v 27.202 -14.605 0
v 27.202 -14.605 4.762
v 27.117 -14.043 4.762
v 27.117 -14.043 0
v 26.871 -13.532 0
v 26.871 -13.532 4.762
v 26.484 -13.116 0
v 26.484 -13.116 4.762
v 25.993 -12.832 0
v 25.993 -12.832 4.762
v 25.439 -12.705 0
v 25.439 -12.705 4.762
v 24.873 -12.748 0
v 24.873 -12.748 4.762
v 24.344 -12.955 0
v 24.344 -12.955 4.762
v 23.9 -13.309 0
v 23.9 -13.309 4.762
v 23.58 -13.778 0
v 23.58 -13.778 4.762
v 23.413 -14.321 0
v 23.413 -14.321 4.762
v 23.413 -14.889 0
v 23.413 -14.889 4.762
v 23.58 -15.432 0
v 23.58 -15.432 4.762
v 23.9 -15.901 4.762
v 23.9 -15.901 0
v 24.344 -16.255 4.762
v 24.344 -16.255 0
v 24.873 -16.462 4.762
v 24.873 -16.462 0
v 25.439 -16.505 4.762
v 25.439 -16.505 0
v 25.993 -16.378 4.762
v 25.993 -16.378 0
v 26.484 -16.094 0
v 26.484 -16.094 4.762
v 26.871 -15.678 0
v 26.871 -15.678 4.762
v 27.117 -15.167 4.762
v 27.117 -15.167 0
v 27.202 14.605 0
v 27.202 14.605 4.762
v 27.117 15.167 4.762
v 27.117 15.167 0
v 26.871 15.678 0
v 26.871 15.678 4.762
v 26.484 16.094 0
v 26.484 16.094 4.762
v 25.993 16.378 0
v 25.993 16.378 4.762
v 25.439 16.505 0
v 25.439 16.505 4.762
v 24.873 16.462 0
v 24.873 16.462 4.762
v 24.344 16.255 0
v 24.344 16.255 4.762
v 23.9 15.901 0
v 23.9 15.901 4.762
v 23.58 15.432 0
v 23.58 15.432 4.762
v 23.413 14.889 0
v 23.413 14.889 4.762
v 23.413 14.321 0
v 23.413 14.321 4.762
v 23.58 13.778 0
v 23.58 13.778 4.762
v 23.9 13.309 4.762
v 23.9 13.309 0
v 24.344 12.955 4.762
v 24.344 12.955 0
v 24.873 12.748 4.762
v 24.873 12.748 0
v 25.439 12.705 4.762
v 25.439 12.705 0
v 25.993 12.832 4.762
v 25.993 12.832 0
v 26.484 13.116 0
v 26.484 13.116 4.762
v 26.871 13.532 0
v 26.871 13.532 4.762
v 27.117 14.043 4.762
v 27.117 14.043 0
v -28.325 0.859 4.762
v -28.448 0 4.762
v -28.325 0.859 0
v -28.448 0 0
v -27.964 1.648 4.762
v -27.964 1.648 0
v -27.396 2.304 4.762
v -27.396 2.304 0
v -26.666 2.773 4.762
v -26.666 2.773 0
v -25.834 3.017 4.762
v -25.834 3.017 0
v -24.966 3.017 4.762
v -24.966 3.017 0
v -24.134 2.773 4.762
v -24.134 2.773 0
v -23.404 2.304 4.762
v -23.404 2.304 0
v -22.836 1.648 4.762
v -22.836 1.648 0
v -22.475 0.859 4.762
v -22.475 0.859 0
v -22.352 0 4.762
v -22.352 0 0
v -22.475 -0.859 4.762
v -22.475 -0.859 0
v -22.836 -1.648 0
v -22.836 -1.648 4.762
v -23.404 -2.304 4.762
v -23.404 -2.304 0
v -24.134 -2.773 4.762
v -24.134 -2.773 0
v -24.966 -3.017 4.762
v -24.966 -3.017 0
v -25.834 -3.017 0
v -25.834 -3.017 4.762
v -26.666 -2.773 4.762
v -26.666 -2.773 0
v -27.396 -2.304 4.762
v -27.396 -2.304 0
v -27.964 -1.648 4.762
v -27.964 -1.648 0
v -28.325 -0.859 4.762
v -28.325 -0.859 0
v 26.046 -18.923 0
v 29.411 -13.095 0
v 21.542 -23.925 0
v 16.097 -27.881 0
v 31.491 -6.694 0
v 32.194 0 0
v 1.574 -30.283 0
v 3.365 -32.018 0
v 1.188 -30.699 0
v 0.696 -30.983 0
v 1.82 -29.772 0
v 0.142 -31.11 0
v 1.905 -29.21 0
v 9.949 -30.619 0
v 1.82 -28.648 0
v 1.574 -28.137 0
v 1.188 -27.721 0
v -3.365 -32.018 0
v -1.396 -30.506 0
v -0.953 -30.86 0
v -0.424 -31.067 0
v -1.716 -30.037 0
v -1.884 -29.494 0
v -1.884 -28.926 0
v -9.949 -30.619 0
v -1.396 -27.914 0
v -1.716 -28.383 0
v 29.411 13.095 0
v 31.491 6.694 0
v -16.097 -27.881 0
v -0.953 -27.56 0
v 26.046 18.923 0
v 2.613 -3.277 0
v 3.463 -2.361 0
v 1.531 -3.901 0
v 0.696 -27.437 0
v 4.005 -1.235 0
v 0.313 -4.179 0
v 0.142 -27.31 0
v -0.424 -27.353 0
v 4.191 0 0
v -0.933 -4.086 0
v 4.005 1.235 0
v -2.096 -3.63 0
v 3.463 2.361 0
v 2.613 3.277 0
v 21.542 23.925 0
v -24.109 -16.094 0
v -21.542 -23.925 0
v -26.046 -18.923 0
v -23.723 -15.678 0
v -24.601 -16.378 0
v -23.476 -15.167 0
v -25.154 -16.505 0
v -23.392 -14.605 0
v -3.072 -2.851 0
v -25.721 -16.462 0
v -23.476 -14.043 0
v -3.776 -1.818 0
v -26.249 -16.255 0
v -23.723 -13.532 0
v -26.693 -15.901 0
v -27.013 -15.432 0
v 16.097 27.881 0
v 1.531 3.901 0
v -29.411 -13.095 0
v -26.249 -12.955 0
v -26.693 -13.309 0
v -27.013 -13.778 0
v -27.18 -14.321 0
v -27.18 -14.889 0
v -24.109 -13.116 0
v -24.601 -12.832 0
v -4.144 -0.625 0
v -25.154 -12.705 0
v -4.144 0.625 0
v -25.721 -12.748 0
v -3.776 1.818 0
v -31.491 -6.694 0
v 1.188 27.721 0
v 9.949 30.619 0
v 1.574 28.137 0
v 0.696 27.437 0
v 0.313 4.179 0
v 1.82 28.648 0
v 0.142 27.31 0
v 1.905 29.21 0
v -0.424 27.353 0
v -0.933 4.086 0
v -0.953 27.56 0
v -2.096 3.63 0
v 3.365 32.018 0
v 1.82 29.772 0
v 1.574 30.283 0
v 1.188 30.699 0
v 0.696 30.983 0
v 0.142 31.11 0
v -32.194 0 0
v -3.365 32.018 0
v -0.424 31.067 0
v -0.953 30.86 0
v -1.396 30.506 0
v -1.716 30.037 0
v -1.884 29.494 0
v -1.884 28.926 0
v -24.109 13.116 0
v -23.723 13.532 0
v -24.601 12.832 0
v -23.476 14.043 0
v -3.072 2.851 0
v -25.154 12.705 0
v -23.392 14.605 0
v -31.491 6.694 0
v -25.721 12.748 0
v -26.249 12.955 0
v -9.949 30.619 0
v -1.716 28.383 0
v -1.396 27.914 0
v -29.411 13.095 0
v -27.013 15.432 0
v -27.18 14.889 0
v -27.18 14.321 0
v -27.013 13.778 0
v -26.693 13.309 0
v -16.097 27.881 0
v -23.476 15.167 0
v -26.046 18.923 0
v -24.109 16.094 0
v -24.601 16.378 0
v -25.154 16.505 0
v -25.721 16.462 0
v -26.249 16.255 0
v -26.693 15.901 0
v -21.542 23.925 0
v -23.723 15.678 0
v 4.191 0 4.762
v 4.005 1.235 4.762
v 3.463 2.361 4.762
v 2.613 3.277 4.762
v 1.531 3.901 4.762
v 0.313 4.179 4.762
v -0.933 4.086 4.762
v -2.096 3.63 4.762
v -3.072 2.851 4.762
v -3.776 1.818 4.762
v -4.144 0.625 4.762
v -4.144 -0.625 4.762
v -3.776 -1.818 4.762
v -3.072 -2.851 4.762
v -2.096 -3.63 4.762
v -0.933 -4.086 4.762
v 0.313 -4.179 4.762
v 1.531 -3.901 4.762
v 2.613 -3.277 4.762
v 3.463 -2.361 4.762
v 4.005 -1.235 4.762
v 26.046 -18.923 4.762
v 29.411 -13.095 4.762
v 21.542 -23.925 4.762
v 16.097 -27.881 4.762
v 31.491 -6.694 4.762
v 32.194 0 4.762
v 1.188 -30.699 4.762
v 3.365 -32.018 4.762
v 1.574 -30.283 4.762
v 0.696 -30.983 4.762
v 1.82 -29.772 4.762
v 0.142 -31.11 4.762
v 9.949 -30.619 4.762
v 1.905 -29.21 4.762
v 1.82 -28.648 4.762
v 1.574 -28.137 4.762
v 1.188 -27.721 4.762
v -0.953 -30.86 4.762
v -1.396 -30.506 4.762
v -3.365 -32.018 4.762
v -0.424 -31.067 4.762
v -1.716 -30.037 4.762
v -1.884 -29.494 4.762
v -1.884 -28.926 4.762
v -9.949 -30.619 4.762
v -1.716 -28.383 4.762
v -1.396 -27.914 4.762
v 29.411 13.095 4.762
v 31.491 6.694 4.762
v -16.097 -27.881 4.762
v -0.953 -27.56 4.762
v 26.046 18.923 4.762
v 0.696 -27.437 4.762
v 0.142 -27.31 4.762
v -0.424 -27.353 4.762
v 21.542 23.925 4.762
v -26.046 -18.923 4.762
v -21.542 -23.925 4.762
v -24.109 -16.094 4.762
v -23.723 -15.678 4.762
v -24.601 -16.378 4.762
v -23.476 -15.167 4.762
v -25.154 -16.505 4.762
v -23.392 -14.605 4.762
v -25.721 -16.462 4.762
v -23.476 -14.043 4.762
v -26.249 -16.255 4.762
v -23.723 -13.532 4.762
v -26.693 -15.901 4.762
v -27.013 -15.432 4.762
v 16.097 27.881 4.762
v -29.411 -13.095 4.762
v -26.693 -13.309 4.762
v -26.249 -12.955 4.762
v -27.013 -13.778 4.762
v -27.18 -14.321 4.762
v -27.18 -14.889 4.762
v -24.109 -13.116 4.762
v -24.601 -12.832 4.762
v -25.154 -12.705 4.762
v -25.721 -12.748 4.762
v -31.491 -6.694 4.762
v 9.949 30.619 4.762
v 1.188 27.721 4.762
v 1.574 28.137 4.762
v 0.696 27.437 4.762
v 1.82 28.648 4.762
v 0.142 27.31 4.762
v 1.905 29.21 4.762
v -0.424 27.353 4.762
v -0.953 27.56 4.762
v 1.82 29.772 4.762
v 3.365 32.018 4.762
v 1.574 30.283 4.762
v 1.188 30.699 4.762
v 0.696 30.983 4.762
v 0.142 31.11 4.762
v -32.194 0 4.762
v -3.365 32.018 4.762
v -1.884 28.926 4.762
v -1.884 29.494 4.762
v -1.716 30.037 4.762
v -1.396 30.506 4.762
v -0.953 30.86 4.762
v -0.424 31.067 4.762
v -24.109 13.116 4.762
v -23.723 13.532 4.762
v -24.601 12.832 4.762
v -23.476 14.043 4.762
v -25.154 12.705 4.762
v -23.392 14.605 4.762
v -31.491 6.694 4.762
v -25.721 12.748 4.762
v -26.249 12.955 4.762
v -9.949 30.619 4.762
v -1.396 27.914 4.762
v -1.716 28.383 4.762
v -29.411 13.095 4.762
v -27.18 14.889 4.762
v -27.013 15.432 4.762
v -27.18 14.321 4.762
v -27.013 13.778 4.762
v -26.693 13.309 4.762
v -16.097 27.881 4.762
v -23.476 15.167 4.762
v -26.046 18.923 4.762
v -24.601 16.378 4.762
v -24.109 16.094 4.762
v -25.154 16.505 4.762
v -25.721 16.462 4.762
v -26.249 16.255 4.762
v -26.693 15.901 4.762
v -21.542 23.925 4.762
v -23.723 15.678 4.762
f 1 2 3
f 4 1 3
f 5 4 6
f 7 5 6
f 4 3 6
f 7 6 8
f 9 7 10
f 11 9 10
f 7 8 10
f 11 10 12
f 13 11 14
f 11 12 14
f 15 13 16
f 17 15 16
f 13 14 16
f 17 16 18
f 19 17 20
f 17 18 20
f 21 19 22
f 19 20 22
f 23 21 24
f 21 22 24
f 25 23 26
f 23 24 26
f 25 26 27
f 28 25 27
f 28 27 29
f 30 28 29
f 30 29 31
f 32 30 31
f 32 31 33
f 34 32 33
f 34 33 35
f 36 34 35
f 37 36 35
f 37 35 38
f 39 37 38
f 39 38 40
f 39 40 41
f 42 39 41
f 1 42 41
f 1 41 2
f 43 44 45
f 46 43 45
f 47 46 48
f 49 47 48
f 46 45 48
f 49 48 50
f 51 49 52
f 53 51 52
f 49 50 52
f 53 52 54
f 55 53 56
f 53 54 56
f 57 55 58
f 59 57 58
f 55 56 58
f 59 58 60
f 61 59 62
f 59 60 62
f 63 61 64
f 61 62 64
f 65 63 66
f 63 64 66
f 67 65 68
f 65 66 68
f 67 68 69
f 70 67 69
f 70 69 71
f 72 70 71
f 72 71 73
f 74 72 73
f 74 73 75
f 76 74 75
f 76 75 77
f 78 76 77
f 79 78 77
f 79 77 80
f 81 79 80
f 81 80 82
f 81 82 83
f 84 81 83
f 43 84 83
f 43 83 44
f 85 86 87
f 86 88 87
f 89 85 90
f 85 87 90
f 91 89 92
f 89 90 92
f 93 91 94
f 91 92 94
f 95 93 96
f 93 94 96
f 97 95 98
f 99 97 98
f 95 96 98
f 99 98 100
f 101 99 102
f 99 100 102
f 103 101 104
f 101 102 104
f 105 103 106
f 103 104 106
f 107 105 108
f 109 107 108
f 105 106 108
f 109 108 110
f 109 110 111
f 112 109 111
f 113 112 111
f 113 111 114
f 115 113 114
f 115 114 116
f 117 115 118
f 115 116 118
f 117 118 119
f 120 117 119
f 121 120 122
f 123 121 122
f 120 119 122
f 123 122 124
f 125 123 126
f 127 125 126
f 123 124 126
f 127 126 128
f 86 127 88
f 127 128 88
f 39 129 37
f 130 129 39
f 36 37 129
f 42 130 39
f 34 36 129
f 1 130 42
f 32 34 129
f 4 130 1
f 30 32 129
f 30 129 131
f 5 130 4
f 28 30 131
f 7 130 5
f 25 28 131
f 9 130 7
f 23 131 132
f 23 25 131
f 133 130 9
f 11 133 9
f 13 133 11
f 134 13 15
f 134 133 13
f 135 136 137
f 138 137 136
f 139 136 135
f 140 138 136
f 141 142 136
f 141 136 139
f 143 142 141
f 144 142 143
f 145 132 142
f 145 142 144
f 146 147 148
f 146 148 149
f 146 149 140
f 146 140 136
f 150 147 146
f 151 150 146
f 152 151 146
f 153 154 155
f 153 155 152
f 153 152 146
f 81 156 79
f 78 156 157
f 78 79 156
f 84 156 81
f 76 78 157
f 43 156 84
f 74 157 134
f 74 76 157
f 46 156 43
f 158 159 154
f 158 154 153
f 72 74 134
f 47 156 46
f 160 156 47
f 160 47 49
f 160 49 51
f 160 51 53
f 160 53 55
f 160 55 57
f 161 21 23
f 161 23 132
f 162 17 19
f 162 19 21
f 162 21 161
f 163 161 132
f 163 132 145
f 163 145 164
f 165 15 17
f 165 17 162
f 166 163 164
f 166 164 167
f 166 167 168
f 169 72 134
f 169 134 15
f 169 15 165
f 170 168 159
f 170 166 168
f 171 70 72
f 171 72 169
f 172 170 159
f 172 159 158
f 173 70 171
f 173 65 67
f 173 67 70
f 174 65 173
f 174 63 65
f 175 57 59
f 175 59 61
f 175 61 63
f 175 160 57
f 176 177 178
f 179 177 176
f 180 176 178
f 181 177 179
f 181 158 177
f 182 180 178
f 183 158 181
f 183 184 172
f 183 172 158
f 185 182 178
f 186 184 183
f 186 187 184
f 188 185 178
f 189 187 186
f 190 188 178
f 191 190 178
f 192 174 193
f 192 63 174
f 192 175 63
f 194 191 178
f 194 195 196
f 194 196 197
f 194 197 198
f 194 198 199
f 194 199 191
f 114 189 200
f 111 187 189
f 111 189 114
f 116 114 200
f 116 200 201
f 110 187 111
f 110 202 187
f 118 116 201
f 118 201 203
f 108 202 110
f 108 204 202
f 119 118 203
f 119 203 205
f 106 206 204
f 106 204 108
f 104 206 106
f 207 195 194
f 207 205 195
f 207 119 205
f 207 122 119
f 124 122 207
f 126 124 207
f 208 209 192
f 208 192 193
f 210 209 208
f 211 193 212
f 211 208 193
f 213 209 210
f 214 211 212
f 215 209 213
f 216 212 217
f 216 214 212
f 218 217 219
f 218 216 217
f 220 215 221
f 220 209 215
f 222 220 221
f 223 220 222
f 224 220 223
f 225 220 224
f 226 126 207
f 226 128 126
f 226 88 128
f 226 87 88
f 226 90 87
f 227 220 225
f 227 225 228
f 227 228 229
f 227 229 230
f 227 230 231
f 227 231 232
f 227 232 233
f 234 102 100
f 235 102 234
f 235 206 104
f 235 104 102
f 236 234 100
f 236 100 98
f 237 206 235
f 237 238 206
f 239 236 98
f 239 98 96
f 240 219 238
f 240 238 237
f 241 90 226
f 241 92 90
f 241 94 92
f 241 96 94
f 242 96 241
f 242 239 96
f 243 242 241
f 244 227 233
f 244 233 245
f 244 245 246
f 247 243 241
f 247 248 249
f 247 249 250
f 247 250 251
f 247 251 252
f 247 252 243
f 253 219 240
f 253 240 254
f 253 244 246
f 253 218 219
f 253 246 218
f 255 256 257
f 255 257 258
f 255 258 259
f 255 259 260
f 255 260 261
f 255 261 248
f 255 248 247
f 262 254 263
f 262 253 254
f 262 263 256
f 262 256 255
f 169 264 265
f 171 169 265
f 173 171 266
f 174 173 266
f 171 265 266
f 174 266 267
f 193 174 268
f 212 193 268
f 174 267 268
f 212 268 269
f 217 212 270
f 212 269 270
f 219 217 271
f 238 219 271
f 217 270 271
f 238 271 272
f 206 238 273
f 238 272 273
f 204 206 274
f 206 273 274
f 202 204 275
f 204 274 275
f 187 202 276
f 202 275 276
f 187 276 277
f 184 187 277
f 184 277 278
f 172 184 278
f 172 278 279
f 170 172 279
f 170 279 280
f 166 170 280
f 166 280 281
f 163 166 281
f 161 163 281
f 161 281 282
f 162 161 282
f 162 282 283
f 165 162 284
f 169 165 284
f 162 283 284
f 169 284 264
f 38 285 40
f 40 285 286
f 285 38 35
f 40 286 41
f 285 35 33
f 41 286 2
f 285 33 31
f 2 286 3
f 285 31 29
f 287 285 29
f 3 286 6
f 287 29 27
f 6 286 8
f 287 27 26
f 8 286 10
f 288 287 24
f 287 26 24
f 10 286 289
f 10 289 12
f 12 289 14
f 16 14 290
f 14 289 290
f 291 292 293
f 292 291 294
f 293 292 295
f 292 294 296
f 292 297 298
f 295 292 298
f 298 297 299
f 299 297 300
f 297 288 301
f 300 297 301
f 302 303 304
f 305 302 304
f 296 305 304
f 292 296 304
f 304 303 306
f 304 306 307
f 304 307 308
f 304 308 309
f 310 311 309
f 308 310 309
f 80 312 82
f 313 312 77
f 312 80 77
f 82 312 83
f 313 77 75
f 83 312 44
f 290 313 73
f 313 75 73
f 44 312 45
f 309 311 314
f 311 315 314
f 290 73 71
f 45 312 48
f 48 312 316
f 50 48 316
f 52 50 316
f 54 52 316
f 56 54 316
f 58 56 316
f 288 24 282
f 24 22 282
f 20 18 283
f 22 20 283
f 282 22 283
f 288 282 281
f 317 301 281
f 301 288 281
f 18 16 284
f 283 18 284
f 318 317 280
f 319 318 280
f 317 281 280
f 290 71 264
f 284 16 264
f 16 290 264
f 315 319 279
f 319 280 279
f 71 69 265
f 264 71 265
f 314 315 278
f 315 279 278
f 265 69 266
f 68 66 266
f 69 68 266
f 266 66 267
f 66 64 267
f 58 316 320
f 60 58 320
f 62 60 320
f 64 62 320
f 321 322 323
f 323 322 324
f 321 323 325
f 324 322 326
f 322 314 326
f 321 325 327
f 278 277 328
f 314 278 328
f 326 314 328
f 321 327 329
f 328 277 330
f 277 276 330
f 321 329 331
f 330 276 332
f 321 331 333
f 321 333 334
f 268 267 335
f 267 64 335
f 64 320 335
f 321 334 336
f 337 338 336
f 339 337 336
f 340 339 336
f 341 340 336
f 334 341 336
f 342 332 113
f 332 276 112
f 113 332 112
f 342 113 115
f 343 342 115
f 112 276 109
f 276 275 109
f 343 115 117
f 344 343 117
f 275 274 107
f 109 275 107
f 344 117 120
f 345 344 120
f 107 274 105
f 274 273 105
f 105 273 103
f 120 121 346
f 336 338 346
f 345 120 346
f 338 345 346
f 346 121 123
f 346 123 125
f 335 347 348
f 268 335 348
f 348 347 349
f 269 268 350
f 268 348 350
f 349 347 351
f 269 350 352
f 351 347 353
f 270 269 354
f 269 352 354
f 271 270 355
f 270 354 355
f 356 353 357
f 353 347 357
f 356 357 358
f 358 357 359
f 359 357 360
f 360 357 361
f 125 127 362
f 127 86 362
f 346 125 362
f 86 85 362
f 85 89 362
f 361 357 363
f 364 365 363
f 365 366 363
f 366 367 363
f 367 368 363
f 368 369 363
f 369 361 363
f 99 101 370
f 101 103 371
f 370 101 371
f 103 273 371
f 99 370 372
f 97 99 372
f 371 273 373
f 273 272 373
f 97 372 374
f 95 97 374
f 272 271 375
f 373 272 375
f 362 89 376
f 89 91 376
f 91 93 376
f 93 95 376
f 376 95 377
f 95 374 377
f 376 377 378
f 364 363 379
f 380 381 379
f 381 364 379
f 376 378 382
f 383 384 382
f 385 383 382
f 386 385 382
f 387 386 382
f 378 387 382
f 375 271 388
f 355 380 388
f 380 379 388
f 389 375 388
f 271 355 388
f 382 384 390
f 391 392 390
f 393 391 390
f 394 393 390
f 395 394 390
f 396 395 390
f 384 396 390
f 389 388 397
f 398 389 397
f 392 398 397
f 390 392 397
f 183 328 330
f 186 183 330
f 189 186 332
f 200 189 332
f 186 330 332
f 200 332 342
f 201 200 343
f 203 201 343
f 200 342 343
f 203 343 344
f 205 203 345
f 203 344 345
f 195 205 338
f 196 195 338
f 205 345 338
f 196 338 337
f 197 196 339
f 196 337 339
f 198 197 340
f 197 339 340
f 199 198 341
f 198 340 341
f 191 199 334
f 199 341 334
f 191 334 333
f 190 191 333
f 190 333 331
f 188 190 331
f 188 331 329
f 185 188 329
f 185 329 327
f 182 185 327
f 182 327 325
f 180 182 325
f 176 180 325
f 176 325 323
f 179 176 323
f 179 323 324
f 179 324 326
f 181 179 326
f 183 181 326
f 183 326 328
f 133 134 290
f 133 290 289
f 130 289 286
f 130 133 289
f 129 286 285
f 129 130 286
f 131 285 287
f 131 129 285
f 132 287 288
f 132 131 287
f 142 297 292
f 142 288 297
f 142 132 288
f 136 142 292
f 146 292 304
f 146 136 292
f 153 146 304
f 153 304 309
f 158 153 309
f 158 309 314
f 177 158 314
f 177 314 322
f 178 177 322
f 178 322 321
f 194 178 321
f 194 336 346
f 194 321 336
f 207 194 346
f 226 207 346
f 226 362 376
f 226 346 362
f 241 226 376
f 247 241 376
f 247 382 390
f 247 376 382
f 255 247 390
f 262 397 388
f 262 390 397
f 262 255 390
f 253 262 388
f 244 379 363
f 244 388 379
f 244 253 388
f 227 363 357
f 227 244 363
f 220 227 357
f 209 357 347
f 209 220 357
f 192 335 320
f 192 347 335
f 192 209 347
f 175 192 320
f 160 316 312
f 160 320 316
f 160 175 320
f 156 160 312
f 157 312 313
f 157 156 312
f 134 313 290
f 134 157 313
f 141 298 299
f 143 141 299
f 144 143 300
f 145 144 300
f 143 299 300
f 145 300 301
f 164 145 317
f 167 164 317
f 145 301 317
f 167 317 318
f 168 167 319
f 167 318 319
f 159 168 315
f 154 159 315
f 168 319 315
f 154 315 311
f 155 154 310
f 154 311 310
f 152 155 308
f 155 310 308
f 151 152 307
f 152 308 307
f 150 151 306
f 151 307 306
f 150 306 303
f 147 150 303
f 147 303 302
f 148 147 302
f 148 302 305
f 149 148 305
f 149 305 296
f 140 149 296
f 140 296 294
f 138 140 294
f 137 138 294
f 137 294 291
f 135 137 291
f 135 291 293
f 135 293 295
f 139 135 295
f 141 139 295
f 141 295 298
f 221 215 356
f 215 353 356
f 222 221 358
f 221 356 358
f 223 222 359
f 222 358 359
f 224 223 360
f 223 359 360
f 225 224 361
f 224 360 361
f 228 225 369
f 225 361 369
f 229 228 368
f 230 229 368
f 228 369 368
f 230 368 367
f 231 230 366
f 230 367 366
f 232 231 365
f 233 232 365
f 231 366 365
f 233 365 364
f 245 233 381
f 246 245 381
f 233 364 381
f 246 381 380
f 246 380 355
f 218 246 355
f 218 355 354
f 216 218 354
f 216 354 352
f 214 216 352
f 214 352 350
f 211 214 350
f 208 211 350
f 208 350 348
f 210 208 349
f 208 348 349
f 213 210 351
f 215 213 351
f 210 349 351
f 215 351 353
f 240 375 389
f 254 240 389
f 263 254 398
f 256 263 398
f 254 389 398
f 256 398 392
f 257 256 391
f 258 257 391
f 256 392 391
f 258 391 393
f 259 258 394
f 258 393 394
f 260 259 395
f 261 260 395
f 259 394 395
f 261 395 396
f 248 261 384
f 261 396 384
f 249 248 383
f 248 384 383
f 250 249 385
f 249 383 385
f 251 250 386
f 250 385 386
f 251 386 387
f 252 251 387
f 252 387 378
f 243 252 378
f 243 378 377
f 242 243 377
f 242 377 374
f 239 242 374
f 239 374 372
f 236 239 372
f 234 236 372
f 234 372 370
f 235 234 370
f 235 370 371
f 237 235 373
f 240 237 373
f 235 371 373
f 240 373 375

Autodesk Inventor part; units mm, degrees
ref_plane "YZ Plane" through (0, 0, 0) normal (1, 0, 0) x (0, 1, 0)
ref_plane "XZ Plane" through (0, 0, 0) normal (0, 1, 0) x (-1, 0, 0)
ref_plane "XY Plane" through (0, 0, 0) normal (0, 0, 1) x (1, 0, 0)
sketch "Sketch1" plane through (0, 0, 0) normal (0, 0, 1) x (1, 0, 0)
  circle A0 centre (0, 0) radius 32.1945
  dimension "d0" = 64.389
extrude "Extrusion1" add sketch "Sketch1" along normal blind 4.7625
sketch "Sketch2" plane through (0, 0, 4.7625) normal (0, 0, 1) x (1, 0, 0)
  line L0 (0, 0) -> (0, 29.21)
  circle A0 centre (0, 29.21) radius 1.905
  circle A1 centre (-25.2966, 14.605) radius 1.905
  circle A2 centre (-25.2966, -14.605) radius 1.905
  circle A3 centre (0, -29.21) radius 1.905
  circle A4 centre (25.2966, -14.605) radius 1.905
  circle A5 centre (25.2966, 14.605) radius 1.905
  dimension "d3" = 29.21
  dimension "d4" = 3.81
  dimension "d7" = 360
extrude "Extrusion2" cut sketch "Sketch2" against normal through all
sketch "Sketch4" plane through (0, 0, 0) normal (0, 0, -1) x (-1, 0, 0)
  line L0 (0, 0) -> (25.4, 0)
  line L1 (20.0474, 0) -> (22.7237, 4.6355)
  line L2 (22.7237, 4.6355) -> (28.0763, 4.6355)
  line L3 (28.0763, 4.6355) -> (30.7526, 0)
  line L4 (30.7526, 0) -> (28.0763, -4.6355)
  line L5 (28.0763, -4.6355) -> (22.7237, -4.6355)
  line L6 (22.7237, -4.6355) -> (20.0474, 0)
  dimension "d12" = 25.4
  dimension "d13" = 9.271
extrude "Extrusion3" cut sketch "Sketch4" against normal through all
sketch "Sketch5" plane through (0, 0, 0) normal (0, 0, -1) x (-1, 0, 0)
  line L0 (22.7237, -4.6355) -> (20.0474, 0) projected
  line L1 (20.0474, 0) -> (22.7237, 4.6355) projected
  line L2 (22.7237, 4.6355) -> (28.0763, 4.6355) projected
  line L3 (28.0763, 4.6355) -> (30.7526, 0) projected
  line L4 (30.7526, 0) -> (28.0763, -4.6355) projected
  line L5 (28.0763, -4.6355) -> (22.7237, -4.6355) projected
  circle A0 centre (0, 0) radius 32.1945 projected
  circle A1 centre (25.4, 0) radius 3.048
  line L6 (0, 0) -> (25.4, 0)
  dimension "d16" = 6.096
  dimension "d22" = 25.4
extrude "Extrusion4" add sketch "Sketch5" against normal up to surface (4.7625 mm away) contours L0 L1 L2 L3 L4 L5
sketch "Sketch6" plane through (0, 0, 4.7625) normal (0, 0, 1) x (1, 0, 0)
  circle A0 centre (0, 0) radius 4.191
  dimension "d19" = 8.382
extrude "Extrusion5" cut sketch "Sketch6" against normal through all
properties part number "pistonSealingDisc" material "Aluminum 6061"
